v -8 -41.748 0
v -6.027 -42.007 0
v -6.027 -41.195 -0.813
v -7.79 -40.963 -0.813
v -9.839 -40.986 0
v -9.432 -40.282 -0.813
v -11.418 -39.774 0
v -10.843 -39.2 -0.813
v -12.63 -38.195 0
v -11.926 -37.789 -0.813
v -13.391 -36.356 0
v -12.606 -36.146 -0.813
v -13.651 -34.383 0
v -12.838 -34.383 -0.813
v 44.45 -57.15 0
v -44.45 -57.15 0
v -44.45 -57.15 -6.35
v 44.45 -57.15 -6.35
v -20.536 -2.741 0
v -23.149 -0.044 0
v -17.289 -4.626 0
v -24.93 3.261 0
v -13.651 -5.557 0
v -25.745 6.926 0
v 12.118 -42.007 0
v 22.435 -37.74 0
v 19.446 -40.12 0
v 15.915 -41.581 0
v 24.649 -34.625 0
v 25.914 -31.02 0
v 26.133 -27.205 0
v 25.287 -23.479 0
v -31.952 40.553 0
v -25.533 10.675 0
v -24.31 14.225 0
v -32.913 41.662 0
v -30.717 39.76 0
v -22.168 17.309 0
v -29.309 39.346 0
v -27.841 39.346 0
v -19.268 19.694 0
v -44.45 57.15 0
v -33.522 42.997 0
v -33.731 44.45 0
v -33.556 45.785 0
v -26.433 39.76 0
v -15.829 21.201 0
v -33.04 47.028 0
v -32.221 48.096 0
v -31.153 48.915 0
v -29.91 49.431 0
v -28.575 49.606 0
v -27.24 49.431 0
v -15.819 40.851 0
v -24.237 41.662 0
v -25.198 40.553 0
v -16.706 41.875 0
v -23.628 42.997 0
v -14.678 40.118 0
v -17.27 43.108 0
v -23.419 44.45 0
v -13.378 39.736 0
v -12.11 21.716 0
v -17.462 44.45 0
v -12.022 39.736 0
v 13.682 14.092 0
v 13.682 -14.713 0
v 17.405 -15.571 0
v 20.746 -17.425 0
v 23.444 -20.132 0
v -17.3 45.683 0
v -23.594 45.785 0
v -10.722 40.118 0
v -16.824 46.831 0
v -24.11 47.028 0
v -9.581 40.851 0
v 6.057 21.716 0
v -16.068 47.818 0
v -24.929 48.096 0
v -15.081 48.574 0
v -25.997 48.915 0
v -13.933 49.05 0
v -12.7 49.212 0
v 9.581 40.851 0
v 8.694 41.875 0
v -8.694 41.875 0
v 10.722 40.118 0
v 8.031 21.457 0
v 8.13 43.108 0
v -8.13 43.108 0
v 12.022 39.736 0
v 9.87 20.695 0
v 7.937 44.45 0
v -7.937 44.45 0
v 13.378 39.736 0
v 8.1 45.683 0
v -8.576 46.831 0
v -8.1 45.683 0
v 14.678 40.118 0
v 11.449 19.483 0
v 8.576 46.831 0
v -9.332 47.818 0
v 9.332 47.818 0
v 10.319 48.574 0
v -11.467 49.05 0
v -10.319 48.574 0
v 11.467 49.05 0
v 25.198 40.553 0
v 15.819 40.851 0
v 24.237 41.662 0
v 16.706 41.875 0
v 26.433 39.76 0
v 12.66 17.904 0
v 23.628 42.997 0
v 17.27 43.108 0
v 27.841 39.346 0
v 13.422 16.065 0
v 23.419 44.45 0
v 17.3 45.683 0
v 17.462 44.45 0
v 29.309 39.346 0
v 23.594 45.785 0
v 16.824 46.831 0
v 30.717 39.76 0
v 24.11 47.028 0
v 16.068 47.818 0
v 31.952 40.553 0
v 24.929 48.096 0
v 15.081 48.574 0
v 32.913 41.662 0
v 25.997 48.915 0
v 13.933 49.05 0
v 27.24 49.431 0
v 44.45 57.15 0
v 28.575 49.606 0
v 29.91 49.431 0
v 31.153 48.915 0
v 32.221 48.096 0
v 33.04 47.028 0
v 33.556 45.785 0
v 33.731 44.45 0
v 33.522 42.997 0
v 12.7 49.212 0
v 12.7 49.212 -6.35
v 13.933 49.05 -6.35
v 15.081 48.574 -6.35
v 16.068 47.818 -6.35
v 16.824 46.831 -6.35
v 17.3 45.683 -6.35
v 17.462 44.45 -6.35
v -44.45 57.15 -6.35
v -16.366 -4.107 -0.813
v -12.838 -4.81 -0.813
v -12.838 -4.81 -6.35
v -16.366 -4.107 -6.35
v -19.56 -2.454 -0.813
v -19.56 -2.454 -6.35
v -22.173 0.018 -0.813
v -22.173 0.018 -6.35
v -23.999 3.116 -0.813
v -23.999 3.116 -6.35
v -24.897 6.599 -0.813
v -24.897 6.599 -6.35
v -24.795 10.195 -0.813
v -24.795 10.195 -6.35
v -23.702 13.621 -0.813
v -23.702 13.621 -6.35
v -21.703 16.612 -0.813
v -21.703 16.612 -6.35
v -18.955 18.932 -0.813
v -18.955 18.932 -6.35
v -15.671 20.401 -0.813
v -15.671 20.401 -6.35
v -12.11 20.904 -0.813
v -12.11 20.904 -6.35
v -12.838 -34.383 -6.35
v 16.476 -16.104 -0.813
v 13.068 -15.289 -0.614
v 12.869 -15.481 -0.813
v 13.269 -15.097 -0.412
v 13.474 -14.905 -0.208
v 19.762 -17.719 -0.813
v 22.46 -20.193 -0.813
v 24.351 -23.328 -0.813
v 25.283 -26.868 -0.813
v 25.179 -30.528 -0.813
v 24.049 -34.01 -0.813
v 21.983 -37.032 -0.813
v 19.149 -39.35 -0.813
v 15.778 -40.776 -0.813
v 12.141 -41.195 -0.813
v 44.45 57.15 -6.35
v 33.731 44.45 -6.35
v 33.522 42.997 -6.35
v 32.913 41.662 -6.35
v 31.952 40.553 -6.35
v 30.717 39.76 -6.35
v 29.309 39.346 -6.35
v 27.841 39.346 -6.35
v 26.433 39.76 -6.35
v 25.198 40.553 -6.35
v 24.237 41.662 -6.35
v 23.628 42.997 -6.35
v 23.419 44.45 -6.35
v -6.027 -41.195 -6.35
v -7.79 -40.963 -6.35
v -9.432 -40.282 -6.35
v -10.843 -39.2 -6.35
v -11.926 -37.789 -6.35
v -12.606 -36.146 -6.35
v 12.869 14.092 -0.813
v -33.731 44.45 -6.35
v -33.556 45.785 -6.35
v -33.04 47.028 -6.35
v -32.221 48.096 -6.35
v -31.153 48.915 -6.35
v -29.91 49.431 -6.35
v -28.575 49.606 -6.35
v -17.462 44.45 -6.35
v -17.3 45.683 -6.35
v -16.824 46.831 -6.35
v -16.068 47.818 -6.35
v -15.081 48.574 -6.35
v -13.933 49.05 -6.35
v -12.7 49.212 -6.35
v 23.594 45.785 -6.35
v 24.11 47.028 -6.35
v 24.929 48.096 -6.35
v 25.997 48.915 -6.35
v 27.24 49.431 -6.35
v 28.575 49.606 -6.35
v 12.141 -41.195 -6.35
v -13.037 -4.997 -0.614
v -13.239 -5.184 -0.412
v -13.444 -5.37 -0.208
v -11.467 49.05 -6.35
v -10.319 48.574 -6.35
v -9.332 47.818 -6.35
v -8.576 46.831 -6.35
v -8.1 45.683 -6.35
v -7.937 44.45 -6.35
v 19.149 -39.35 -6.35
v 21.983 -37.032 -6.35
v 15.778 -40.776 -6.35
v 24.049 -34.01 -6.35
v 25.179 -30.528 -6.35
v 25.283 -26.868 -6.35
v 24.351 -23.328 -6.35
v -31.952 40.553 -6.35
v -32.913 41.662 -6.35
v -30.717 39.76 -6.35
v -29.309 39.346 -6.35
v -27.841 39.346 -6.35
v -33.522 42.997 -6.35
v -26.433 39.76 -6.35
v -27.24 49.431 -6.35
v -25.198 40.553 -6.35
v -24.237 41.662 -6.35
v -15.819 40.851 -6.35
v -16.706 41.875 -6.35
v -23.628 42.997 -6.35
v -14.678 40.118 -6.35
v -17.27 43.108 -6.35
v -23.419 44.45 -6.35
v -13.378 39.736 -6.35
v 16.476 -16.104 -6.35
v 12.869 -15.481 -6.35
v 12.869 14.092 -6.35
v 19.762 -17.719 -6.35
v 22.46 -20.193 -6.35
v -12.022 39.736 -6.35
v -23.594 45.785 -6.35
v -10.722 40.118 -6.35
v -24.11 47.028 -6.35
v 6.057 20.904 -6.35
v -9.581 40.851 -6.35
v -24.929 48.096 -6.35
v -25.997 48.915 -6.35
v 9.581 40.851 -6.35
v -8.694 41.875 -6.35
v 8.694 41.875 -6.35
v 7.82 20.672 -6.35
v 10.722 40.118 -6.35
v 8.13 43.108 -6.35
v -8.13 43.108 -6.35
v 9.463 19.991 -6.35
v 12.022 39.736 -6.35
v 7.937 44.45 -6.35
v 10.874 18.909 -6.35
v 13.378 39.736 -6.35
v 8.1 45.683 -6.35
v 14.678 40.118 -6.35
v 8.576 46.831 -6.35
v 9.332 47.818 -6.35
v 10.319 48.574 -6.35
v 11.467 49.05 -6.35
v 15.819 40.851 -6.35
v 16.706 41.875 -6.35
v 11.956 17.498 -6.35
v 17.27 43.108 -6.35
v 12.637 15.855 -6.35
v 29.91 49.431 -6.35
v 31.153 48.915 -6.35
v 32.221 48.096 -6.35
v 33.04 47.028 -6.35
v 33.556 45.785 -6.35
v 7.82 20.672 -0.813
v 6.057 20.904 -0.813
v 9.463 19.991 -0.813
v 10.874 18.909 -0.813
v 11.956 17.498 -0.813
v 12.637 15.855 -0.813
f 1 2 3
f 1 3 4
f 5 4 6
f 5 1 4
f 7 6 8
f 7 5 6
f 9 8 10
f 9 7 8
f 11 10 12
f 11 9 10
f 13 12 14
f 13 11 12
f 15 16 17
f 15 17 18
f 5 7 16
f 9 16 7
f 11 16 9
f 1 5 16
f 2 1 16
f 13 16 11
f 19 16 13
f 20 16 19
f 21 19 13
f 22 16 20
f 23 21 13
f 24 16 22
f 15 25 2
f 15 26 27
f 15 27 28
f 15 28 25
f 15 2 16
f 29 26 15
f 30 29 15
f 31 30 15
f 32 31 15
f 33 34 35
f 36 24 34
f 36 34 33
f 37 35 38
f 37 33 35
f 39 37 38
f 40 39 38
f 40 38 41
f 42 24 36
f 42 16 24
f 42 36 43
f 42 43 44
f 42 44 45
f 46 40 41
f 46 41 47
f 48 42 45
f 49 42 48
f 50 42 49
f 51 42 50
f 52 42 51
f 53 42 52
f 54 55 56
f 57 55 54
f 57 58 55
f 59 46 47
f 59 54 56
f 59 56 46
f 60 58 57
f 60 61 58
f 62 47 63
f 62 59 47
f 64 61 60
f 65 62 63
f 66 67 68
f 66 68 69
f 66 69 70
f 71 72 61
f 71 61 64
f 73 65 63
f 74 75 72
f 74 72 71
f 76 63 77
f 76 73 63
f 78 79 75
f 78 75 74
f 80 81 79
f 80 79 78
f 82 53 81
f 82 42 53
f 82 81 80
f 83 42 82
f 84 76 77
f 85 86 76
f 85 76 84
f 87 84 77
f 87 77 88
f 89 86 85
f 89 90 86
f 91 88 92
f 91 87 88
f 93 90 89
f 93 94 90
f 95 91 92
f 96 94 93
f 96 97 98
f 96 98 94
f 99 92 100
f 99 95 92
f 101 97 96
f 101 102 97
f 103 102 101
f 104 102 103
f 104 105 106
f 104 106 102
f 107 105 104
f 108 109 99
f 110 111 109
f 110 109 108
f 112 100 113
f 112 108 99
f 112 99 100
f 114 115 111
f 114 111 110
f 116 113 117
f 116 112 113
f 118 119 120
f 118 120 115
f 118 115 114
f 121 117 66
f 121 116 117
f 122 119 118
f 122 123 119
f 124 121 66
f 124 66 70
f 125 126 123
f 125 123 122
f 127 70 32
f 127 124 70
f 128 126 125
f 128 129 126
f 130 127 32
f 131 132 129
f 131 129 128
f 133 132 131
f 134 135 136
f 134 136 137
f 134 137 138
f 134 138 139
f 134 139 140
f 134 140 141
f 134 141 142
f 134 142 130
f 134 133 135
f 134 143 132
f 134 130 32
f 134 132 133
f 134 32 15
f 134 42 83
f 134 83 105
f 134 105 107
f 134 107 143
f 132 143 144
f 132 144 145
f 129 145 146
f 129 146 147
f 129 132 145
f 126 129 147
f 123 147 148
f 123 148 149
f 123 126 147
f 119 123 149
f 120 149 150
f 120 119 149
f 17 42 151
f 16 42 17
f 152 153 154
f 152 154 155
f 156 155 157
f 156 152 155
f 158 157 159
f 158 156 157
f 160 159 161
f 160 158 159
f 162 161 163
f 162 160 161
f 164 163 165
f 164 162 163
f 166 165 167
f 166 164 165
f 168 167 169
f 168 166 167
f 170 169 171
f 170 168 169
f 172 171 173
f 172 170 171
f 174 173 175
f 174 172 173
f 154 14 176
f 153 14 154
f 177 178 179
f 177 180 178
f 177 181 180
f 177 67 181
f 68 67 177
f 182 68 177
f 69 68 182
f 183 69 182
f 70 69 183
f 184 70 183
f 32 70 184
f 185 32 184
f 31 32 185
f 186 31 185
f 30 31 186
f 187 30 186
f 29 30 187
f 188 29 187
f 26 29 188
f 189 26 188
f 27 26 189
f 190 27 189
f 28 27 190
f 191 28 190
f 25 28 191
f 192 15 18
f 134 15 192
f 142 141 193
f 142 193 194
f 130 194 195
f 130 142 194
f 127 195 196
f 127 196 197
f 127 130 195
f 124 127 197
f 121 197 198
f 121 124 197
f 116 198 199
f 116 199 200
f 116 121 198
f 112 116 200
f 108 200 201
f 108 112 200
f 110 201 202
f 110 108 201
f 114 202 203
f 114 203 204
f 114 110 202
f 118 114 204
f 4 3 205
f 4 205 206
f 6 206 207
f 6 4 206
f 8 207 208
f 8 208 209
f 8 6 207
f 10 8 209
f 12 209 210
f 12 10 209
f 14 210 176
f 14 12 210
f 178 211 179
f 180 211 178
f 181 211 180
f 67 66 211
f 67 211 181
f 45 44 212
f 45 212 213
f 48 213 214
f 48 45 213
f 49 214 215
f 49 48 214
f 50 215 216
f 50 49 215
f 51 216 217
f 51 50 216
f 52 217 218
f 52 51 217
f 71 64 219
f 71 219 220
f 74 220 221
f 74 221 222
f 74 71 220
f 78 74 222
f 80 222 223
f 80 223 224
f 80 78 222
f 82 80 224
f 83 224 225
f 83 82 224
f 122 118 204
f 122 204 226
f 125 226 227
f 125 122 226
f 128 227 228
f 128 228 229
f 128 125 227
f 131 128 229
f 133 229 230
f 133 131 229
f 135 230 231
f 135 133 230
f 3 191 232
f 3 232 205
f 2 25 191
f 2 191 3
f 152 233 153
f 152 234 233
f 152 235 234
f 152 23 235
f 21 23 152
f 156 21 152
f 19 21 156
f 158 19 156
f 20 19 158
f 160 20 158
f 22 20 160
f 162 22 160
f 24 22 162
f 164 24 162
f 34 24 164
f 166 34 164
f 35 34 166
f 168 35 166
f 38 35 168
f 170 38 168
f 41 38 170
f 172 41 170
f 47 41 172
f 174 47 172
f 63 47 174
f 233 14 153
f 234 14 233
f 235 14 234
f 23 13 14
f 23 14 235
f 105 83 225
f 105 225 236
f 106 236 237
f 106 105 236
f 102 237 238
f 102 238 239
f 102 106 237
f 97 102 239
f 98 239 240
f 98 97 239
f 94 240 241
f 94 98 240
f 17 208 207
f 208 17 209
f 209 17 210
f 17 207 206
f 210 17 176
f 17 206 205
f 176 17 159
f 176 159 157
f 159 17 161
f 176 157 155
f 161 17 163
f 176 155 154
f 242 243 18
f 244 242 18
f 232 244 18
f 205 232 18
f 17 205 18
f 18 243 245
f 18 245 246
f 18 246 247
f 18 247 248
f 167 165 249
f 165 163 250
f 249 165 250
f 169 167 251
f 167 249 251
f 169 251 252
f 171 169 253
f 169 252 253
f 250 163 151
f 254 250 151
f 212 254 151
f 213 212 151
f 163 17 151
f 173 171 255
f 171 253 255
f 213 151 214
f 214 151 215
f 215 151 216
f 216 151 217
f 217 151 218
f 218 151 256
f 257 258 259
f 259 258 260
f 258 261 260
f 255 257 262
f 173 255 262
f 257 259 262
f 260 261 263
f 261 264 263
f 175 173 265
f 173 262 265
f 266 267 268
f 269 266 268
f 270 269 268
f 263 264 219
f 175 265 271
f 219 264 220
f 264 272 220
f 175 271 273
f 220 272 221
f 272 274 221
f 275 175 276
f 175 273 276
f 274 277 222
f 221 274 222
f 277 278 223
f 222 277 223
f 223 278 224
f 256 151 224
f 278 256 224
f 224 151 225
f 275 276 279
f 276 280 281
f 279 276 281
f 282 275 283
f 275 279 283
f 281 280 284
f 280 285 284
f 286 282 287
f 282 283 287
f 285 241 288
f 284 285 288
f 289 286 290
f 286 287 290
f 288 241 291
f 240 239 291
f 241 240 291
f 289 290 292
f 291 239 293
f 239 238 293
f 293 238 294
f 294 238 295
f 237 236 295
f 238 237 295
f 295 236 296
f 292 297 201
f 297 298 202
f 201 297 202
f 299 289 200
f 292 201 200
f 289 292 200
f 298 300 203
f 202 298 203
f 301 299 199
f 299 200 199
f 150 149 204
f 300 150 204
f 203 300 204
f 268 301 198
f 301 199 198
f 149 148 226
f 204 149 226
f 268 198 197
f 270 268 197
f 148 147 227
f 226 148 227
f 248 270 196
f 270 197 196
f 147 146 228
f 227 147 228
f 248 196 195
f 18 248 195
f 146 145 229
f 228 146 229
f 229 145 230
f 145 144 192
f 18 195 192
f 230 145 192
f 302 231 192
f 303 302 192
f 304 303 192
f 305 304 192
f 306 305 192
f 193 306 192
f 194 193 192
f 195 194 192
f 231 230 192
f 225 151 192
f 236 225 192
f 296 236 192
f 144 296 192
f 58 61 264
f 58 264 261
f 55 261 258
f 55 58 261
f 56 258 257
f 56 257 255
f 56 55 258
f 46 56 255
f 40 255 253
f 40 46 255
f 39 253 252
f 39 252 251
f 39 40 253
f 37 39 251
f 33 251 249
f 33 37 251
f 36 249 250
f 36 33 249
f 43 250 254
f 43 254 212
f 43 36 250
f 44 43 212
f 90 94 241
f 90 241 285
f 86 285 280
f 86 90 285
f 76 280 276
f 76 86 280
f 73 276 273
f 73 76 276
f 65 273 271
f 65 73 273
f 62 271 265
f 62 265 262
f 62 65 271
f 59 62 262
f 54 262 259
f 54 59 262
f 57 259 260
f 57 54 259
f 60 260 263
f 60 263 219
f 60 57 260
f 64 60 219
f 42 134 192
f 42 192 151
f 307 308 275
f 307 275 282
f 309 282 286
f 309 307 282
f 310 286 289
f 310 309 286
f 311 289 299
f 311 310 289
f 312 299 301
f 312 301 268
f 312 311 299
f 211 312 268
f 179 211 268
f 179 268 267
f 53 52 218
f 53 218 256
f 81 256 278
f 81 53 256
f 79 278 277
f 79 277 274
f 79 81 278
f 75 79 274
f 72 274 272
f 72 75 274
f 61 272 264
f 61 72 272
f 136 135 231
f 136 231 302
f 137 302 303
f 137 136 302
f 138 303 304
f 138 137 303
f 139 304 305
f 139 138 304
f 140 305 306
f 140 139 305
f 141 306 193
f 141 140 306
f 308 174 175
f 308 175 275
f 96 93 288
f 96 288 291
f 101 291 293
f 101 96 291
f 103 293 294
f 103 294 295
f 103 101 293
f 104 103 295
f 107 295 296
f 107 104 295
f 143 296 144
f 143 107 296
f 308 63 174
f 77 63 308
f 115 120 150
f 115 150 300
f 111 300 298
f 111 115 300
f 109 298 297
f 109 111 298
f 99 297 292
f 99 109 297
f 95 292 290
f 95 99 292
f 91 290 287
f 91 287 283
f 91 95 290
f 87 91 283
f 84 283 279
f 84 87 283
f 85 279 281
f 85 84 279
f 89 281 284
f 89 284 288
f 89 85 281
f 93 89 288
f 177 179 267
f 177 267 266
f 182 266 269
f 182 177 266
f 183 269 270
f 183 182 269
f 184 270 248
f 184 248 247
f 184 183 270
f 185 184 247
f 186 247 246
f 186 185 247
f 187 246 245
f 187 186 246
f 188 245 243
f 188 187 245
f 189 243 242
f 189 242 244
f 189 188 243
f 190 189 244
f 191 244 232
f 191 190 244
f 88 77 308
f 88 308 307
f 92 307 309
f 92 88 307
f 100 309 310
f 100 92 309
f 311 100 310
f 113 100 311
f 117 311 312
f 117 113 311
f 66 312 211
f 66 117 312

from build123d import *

# Parameters (mm, degrees)
F1_DEPTH = 6.35
F2_SIZE  = 0.8128


with BuildPart() as f1:
    # F0 (on Top) → F1 (new body)
    with BuildSketch(Plane.XY):
        with BuildLine():
            Line((-44.45, -57.15), (44.45, -57.15))
            Line((44.45, -57.15), (44.45, 44.45))
            Line((44.45, 44.45), (33.7312, 44.45))
            ThreePointArc((33.7312, 44.45), (28.575, 39.2938), (23.4188, 44.45))
            Line((23.4188, 44.45), (17.4625, 44.45))
            ThreePointArc((17.4625, 44.45), (12.7, 39.6875), (7.9375, 44.45))
            Line((7.9375, 44.45), (-7.9375, 44.45))
            ThreePointArc((-7.9375, 44.45), (-12.7, 39.6875), (-17.4625, 44.45))
            Line((-17.4625, 44.45), (-23.4188, 44.45))
            ThreePointArc((-23.4188, 44.45), (-28.575, 39.2938), (-33.7312, 44.45))
            Line((-33.7312, 44.45), (-44.45, 44.45))
            Line((-44.45, 44.45), (-44.45, -57.15))
        make_face()
        with BuildLine():
            Line((-12.109895, 20.903632), (6.057415, 20.903632))
            ThreePointArc((6.057415, 20.903632), (10.873895, 18.908581), (12.868946, 14.092101))
            Line((12.868946, 14.092101), (12.868946, -15.48064))
            ThreePointArc((12.868946, -15.48064), (25.361762, -28.701794), (12.140608, -41.194611))
            Line((12.140608, -41.194611), (-6.026703, -41.194611))
            ThreePointArc((-6.026703, -41.194611), (-10.843182, -39.19956), (-12.838233, -34.383081))
            Line((-12.838233, -34.383081), (-12.838233, -4.810339))
            ThreePointArc((-12.838233, -4.810339), (-24.972037, 8.400646), (-12.109895, 20.903632))
        make_face(mode=Mode.SUBTRACT)
        with BuildLine():
            Line((33.7312, 44.45), (44.45, 44.45))
            Line((44.45, 44.45), (44.45, 57.15))
            Line((44.45, 57.15), (28.575, 57.15))
            Line((28.575, 57.15), (28.575, 49.6062))
            ThreePointArc((28.575, 49.6062), (32.220984, 48.095984), (33.7312, 44.45))
        make_face()
        with BuildLine():
            Line((-44.45, 57.15), (-44.45, 44.45))
            Line((-44.45, 44.45), (-33.7312, 44.45))
            ThreePointArc((-33.7312, 44.45), (-32.220984, 48.095984), (-28.575, 49.6062))
            Line((-28.575, 49.6062), (-28.575, 57.15))
            Line((-28.575, 57.15), (-44.45, 57.15))
        make_face()
        with BuildLine():
            Line((28.575, 49.6062), (28.575, 57.15))
            Line((28.575, 57.15), (12.7, 57.15))
            Line((12.7, 57.15), (12.7, 49.2125))
            ThreePointArc((12.7, 49.2125), (16.067596, 47.817596), (17.4625, 44.45))
            Line((17.4625, 44.45), (23.4188, 44.45))
            ThreePointArc((23.4188, 44.45), (24.929016, 48.095984), (28.575, 49.6062))
        make_face()
        with BuildLine():
            Line((-12.7, 57.15), (-28.575, 57.15))
            Line((-28.575, 57.15), (-28.575, 49.6062))
            ThreePointArc((-28.575, 49.6062), (-24.929016, 48.095984), (-23.4188, 44.45))
            Line((-23.4188, 44.45), (-17.4625, 44.45))
            ThreePointArc((-17.4625, 44.45), (-16.067596, 47.817596), (-12.7, 49.2125))
            Line((-12.7, 49.2125), (-12.7, 57.15))
        make_face()
        with BuildLine():
            Line((12.7, 49.2125), (12.7, 57.15))
            Line((12.7, 57.15), (-12.7, 57.15))
            Line((-12.7, 57.15), (-12.7, 49.2125))
            ThreePointArc((-12.7, 49.2125), (-9.332404, 47.817596), (-7.9375, 44.45))
            Line((-7.9375, 44.45), (7.9375, 44.45))
            ThreePointArc((7.9375, 44.45), (9.332404, 47.817596), (12.7, 49.2125))
        make_face()
    extrude(amount=-F1_DEPTH)

    # F2
    f2_edges = [f1.edges().sort_by_distance(p)[0] for p in [
        (12.868946, -0.694269, 0),
        (-12.838233, -19.59671, 0),
        (-10.843182, -39.19956, 0),
        (3.056952, -41.194611, 0),
        (25.361762, -28.701794, 0),
    ]]
    chamfer(f2_edges, length=F2_SIZE)


solid = f1.part
